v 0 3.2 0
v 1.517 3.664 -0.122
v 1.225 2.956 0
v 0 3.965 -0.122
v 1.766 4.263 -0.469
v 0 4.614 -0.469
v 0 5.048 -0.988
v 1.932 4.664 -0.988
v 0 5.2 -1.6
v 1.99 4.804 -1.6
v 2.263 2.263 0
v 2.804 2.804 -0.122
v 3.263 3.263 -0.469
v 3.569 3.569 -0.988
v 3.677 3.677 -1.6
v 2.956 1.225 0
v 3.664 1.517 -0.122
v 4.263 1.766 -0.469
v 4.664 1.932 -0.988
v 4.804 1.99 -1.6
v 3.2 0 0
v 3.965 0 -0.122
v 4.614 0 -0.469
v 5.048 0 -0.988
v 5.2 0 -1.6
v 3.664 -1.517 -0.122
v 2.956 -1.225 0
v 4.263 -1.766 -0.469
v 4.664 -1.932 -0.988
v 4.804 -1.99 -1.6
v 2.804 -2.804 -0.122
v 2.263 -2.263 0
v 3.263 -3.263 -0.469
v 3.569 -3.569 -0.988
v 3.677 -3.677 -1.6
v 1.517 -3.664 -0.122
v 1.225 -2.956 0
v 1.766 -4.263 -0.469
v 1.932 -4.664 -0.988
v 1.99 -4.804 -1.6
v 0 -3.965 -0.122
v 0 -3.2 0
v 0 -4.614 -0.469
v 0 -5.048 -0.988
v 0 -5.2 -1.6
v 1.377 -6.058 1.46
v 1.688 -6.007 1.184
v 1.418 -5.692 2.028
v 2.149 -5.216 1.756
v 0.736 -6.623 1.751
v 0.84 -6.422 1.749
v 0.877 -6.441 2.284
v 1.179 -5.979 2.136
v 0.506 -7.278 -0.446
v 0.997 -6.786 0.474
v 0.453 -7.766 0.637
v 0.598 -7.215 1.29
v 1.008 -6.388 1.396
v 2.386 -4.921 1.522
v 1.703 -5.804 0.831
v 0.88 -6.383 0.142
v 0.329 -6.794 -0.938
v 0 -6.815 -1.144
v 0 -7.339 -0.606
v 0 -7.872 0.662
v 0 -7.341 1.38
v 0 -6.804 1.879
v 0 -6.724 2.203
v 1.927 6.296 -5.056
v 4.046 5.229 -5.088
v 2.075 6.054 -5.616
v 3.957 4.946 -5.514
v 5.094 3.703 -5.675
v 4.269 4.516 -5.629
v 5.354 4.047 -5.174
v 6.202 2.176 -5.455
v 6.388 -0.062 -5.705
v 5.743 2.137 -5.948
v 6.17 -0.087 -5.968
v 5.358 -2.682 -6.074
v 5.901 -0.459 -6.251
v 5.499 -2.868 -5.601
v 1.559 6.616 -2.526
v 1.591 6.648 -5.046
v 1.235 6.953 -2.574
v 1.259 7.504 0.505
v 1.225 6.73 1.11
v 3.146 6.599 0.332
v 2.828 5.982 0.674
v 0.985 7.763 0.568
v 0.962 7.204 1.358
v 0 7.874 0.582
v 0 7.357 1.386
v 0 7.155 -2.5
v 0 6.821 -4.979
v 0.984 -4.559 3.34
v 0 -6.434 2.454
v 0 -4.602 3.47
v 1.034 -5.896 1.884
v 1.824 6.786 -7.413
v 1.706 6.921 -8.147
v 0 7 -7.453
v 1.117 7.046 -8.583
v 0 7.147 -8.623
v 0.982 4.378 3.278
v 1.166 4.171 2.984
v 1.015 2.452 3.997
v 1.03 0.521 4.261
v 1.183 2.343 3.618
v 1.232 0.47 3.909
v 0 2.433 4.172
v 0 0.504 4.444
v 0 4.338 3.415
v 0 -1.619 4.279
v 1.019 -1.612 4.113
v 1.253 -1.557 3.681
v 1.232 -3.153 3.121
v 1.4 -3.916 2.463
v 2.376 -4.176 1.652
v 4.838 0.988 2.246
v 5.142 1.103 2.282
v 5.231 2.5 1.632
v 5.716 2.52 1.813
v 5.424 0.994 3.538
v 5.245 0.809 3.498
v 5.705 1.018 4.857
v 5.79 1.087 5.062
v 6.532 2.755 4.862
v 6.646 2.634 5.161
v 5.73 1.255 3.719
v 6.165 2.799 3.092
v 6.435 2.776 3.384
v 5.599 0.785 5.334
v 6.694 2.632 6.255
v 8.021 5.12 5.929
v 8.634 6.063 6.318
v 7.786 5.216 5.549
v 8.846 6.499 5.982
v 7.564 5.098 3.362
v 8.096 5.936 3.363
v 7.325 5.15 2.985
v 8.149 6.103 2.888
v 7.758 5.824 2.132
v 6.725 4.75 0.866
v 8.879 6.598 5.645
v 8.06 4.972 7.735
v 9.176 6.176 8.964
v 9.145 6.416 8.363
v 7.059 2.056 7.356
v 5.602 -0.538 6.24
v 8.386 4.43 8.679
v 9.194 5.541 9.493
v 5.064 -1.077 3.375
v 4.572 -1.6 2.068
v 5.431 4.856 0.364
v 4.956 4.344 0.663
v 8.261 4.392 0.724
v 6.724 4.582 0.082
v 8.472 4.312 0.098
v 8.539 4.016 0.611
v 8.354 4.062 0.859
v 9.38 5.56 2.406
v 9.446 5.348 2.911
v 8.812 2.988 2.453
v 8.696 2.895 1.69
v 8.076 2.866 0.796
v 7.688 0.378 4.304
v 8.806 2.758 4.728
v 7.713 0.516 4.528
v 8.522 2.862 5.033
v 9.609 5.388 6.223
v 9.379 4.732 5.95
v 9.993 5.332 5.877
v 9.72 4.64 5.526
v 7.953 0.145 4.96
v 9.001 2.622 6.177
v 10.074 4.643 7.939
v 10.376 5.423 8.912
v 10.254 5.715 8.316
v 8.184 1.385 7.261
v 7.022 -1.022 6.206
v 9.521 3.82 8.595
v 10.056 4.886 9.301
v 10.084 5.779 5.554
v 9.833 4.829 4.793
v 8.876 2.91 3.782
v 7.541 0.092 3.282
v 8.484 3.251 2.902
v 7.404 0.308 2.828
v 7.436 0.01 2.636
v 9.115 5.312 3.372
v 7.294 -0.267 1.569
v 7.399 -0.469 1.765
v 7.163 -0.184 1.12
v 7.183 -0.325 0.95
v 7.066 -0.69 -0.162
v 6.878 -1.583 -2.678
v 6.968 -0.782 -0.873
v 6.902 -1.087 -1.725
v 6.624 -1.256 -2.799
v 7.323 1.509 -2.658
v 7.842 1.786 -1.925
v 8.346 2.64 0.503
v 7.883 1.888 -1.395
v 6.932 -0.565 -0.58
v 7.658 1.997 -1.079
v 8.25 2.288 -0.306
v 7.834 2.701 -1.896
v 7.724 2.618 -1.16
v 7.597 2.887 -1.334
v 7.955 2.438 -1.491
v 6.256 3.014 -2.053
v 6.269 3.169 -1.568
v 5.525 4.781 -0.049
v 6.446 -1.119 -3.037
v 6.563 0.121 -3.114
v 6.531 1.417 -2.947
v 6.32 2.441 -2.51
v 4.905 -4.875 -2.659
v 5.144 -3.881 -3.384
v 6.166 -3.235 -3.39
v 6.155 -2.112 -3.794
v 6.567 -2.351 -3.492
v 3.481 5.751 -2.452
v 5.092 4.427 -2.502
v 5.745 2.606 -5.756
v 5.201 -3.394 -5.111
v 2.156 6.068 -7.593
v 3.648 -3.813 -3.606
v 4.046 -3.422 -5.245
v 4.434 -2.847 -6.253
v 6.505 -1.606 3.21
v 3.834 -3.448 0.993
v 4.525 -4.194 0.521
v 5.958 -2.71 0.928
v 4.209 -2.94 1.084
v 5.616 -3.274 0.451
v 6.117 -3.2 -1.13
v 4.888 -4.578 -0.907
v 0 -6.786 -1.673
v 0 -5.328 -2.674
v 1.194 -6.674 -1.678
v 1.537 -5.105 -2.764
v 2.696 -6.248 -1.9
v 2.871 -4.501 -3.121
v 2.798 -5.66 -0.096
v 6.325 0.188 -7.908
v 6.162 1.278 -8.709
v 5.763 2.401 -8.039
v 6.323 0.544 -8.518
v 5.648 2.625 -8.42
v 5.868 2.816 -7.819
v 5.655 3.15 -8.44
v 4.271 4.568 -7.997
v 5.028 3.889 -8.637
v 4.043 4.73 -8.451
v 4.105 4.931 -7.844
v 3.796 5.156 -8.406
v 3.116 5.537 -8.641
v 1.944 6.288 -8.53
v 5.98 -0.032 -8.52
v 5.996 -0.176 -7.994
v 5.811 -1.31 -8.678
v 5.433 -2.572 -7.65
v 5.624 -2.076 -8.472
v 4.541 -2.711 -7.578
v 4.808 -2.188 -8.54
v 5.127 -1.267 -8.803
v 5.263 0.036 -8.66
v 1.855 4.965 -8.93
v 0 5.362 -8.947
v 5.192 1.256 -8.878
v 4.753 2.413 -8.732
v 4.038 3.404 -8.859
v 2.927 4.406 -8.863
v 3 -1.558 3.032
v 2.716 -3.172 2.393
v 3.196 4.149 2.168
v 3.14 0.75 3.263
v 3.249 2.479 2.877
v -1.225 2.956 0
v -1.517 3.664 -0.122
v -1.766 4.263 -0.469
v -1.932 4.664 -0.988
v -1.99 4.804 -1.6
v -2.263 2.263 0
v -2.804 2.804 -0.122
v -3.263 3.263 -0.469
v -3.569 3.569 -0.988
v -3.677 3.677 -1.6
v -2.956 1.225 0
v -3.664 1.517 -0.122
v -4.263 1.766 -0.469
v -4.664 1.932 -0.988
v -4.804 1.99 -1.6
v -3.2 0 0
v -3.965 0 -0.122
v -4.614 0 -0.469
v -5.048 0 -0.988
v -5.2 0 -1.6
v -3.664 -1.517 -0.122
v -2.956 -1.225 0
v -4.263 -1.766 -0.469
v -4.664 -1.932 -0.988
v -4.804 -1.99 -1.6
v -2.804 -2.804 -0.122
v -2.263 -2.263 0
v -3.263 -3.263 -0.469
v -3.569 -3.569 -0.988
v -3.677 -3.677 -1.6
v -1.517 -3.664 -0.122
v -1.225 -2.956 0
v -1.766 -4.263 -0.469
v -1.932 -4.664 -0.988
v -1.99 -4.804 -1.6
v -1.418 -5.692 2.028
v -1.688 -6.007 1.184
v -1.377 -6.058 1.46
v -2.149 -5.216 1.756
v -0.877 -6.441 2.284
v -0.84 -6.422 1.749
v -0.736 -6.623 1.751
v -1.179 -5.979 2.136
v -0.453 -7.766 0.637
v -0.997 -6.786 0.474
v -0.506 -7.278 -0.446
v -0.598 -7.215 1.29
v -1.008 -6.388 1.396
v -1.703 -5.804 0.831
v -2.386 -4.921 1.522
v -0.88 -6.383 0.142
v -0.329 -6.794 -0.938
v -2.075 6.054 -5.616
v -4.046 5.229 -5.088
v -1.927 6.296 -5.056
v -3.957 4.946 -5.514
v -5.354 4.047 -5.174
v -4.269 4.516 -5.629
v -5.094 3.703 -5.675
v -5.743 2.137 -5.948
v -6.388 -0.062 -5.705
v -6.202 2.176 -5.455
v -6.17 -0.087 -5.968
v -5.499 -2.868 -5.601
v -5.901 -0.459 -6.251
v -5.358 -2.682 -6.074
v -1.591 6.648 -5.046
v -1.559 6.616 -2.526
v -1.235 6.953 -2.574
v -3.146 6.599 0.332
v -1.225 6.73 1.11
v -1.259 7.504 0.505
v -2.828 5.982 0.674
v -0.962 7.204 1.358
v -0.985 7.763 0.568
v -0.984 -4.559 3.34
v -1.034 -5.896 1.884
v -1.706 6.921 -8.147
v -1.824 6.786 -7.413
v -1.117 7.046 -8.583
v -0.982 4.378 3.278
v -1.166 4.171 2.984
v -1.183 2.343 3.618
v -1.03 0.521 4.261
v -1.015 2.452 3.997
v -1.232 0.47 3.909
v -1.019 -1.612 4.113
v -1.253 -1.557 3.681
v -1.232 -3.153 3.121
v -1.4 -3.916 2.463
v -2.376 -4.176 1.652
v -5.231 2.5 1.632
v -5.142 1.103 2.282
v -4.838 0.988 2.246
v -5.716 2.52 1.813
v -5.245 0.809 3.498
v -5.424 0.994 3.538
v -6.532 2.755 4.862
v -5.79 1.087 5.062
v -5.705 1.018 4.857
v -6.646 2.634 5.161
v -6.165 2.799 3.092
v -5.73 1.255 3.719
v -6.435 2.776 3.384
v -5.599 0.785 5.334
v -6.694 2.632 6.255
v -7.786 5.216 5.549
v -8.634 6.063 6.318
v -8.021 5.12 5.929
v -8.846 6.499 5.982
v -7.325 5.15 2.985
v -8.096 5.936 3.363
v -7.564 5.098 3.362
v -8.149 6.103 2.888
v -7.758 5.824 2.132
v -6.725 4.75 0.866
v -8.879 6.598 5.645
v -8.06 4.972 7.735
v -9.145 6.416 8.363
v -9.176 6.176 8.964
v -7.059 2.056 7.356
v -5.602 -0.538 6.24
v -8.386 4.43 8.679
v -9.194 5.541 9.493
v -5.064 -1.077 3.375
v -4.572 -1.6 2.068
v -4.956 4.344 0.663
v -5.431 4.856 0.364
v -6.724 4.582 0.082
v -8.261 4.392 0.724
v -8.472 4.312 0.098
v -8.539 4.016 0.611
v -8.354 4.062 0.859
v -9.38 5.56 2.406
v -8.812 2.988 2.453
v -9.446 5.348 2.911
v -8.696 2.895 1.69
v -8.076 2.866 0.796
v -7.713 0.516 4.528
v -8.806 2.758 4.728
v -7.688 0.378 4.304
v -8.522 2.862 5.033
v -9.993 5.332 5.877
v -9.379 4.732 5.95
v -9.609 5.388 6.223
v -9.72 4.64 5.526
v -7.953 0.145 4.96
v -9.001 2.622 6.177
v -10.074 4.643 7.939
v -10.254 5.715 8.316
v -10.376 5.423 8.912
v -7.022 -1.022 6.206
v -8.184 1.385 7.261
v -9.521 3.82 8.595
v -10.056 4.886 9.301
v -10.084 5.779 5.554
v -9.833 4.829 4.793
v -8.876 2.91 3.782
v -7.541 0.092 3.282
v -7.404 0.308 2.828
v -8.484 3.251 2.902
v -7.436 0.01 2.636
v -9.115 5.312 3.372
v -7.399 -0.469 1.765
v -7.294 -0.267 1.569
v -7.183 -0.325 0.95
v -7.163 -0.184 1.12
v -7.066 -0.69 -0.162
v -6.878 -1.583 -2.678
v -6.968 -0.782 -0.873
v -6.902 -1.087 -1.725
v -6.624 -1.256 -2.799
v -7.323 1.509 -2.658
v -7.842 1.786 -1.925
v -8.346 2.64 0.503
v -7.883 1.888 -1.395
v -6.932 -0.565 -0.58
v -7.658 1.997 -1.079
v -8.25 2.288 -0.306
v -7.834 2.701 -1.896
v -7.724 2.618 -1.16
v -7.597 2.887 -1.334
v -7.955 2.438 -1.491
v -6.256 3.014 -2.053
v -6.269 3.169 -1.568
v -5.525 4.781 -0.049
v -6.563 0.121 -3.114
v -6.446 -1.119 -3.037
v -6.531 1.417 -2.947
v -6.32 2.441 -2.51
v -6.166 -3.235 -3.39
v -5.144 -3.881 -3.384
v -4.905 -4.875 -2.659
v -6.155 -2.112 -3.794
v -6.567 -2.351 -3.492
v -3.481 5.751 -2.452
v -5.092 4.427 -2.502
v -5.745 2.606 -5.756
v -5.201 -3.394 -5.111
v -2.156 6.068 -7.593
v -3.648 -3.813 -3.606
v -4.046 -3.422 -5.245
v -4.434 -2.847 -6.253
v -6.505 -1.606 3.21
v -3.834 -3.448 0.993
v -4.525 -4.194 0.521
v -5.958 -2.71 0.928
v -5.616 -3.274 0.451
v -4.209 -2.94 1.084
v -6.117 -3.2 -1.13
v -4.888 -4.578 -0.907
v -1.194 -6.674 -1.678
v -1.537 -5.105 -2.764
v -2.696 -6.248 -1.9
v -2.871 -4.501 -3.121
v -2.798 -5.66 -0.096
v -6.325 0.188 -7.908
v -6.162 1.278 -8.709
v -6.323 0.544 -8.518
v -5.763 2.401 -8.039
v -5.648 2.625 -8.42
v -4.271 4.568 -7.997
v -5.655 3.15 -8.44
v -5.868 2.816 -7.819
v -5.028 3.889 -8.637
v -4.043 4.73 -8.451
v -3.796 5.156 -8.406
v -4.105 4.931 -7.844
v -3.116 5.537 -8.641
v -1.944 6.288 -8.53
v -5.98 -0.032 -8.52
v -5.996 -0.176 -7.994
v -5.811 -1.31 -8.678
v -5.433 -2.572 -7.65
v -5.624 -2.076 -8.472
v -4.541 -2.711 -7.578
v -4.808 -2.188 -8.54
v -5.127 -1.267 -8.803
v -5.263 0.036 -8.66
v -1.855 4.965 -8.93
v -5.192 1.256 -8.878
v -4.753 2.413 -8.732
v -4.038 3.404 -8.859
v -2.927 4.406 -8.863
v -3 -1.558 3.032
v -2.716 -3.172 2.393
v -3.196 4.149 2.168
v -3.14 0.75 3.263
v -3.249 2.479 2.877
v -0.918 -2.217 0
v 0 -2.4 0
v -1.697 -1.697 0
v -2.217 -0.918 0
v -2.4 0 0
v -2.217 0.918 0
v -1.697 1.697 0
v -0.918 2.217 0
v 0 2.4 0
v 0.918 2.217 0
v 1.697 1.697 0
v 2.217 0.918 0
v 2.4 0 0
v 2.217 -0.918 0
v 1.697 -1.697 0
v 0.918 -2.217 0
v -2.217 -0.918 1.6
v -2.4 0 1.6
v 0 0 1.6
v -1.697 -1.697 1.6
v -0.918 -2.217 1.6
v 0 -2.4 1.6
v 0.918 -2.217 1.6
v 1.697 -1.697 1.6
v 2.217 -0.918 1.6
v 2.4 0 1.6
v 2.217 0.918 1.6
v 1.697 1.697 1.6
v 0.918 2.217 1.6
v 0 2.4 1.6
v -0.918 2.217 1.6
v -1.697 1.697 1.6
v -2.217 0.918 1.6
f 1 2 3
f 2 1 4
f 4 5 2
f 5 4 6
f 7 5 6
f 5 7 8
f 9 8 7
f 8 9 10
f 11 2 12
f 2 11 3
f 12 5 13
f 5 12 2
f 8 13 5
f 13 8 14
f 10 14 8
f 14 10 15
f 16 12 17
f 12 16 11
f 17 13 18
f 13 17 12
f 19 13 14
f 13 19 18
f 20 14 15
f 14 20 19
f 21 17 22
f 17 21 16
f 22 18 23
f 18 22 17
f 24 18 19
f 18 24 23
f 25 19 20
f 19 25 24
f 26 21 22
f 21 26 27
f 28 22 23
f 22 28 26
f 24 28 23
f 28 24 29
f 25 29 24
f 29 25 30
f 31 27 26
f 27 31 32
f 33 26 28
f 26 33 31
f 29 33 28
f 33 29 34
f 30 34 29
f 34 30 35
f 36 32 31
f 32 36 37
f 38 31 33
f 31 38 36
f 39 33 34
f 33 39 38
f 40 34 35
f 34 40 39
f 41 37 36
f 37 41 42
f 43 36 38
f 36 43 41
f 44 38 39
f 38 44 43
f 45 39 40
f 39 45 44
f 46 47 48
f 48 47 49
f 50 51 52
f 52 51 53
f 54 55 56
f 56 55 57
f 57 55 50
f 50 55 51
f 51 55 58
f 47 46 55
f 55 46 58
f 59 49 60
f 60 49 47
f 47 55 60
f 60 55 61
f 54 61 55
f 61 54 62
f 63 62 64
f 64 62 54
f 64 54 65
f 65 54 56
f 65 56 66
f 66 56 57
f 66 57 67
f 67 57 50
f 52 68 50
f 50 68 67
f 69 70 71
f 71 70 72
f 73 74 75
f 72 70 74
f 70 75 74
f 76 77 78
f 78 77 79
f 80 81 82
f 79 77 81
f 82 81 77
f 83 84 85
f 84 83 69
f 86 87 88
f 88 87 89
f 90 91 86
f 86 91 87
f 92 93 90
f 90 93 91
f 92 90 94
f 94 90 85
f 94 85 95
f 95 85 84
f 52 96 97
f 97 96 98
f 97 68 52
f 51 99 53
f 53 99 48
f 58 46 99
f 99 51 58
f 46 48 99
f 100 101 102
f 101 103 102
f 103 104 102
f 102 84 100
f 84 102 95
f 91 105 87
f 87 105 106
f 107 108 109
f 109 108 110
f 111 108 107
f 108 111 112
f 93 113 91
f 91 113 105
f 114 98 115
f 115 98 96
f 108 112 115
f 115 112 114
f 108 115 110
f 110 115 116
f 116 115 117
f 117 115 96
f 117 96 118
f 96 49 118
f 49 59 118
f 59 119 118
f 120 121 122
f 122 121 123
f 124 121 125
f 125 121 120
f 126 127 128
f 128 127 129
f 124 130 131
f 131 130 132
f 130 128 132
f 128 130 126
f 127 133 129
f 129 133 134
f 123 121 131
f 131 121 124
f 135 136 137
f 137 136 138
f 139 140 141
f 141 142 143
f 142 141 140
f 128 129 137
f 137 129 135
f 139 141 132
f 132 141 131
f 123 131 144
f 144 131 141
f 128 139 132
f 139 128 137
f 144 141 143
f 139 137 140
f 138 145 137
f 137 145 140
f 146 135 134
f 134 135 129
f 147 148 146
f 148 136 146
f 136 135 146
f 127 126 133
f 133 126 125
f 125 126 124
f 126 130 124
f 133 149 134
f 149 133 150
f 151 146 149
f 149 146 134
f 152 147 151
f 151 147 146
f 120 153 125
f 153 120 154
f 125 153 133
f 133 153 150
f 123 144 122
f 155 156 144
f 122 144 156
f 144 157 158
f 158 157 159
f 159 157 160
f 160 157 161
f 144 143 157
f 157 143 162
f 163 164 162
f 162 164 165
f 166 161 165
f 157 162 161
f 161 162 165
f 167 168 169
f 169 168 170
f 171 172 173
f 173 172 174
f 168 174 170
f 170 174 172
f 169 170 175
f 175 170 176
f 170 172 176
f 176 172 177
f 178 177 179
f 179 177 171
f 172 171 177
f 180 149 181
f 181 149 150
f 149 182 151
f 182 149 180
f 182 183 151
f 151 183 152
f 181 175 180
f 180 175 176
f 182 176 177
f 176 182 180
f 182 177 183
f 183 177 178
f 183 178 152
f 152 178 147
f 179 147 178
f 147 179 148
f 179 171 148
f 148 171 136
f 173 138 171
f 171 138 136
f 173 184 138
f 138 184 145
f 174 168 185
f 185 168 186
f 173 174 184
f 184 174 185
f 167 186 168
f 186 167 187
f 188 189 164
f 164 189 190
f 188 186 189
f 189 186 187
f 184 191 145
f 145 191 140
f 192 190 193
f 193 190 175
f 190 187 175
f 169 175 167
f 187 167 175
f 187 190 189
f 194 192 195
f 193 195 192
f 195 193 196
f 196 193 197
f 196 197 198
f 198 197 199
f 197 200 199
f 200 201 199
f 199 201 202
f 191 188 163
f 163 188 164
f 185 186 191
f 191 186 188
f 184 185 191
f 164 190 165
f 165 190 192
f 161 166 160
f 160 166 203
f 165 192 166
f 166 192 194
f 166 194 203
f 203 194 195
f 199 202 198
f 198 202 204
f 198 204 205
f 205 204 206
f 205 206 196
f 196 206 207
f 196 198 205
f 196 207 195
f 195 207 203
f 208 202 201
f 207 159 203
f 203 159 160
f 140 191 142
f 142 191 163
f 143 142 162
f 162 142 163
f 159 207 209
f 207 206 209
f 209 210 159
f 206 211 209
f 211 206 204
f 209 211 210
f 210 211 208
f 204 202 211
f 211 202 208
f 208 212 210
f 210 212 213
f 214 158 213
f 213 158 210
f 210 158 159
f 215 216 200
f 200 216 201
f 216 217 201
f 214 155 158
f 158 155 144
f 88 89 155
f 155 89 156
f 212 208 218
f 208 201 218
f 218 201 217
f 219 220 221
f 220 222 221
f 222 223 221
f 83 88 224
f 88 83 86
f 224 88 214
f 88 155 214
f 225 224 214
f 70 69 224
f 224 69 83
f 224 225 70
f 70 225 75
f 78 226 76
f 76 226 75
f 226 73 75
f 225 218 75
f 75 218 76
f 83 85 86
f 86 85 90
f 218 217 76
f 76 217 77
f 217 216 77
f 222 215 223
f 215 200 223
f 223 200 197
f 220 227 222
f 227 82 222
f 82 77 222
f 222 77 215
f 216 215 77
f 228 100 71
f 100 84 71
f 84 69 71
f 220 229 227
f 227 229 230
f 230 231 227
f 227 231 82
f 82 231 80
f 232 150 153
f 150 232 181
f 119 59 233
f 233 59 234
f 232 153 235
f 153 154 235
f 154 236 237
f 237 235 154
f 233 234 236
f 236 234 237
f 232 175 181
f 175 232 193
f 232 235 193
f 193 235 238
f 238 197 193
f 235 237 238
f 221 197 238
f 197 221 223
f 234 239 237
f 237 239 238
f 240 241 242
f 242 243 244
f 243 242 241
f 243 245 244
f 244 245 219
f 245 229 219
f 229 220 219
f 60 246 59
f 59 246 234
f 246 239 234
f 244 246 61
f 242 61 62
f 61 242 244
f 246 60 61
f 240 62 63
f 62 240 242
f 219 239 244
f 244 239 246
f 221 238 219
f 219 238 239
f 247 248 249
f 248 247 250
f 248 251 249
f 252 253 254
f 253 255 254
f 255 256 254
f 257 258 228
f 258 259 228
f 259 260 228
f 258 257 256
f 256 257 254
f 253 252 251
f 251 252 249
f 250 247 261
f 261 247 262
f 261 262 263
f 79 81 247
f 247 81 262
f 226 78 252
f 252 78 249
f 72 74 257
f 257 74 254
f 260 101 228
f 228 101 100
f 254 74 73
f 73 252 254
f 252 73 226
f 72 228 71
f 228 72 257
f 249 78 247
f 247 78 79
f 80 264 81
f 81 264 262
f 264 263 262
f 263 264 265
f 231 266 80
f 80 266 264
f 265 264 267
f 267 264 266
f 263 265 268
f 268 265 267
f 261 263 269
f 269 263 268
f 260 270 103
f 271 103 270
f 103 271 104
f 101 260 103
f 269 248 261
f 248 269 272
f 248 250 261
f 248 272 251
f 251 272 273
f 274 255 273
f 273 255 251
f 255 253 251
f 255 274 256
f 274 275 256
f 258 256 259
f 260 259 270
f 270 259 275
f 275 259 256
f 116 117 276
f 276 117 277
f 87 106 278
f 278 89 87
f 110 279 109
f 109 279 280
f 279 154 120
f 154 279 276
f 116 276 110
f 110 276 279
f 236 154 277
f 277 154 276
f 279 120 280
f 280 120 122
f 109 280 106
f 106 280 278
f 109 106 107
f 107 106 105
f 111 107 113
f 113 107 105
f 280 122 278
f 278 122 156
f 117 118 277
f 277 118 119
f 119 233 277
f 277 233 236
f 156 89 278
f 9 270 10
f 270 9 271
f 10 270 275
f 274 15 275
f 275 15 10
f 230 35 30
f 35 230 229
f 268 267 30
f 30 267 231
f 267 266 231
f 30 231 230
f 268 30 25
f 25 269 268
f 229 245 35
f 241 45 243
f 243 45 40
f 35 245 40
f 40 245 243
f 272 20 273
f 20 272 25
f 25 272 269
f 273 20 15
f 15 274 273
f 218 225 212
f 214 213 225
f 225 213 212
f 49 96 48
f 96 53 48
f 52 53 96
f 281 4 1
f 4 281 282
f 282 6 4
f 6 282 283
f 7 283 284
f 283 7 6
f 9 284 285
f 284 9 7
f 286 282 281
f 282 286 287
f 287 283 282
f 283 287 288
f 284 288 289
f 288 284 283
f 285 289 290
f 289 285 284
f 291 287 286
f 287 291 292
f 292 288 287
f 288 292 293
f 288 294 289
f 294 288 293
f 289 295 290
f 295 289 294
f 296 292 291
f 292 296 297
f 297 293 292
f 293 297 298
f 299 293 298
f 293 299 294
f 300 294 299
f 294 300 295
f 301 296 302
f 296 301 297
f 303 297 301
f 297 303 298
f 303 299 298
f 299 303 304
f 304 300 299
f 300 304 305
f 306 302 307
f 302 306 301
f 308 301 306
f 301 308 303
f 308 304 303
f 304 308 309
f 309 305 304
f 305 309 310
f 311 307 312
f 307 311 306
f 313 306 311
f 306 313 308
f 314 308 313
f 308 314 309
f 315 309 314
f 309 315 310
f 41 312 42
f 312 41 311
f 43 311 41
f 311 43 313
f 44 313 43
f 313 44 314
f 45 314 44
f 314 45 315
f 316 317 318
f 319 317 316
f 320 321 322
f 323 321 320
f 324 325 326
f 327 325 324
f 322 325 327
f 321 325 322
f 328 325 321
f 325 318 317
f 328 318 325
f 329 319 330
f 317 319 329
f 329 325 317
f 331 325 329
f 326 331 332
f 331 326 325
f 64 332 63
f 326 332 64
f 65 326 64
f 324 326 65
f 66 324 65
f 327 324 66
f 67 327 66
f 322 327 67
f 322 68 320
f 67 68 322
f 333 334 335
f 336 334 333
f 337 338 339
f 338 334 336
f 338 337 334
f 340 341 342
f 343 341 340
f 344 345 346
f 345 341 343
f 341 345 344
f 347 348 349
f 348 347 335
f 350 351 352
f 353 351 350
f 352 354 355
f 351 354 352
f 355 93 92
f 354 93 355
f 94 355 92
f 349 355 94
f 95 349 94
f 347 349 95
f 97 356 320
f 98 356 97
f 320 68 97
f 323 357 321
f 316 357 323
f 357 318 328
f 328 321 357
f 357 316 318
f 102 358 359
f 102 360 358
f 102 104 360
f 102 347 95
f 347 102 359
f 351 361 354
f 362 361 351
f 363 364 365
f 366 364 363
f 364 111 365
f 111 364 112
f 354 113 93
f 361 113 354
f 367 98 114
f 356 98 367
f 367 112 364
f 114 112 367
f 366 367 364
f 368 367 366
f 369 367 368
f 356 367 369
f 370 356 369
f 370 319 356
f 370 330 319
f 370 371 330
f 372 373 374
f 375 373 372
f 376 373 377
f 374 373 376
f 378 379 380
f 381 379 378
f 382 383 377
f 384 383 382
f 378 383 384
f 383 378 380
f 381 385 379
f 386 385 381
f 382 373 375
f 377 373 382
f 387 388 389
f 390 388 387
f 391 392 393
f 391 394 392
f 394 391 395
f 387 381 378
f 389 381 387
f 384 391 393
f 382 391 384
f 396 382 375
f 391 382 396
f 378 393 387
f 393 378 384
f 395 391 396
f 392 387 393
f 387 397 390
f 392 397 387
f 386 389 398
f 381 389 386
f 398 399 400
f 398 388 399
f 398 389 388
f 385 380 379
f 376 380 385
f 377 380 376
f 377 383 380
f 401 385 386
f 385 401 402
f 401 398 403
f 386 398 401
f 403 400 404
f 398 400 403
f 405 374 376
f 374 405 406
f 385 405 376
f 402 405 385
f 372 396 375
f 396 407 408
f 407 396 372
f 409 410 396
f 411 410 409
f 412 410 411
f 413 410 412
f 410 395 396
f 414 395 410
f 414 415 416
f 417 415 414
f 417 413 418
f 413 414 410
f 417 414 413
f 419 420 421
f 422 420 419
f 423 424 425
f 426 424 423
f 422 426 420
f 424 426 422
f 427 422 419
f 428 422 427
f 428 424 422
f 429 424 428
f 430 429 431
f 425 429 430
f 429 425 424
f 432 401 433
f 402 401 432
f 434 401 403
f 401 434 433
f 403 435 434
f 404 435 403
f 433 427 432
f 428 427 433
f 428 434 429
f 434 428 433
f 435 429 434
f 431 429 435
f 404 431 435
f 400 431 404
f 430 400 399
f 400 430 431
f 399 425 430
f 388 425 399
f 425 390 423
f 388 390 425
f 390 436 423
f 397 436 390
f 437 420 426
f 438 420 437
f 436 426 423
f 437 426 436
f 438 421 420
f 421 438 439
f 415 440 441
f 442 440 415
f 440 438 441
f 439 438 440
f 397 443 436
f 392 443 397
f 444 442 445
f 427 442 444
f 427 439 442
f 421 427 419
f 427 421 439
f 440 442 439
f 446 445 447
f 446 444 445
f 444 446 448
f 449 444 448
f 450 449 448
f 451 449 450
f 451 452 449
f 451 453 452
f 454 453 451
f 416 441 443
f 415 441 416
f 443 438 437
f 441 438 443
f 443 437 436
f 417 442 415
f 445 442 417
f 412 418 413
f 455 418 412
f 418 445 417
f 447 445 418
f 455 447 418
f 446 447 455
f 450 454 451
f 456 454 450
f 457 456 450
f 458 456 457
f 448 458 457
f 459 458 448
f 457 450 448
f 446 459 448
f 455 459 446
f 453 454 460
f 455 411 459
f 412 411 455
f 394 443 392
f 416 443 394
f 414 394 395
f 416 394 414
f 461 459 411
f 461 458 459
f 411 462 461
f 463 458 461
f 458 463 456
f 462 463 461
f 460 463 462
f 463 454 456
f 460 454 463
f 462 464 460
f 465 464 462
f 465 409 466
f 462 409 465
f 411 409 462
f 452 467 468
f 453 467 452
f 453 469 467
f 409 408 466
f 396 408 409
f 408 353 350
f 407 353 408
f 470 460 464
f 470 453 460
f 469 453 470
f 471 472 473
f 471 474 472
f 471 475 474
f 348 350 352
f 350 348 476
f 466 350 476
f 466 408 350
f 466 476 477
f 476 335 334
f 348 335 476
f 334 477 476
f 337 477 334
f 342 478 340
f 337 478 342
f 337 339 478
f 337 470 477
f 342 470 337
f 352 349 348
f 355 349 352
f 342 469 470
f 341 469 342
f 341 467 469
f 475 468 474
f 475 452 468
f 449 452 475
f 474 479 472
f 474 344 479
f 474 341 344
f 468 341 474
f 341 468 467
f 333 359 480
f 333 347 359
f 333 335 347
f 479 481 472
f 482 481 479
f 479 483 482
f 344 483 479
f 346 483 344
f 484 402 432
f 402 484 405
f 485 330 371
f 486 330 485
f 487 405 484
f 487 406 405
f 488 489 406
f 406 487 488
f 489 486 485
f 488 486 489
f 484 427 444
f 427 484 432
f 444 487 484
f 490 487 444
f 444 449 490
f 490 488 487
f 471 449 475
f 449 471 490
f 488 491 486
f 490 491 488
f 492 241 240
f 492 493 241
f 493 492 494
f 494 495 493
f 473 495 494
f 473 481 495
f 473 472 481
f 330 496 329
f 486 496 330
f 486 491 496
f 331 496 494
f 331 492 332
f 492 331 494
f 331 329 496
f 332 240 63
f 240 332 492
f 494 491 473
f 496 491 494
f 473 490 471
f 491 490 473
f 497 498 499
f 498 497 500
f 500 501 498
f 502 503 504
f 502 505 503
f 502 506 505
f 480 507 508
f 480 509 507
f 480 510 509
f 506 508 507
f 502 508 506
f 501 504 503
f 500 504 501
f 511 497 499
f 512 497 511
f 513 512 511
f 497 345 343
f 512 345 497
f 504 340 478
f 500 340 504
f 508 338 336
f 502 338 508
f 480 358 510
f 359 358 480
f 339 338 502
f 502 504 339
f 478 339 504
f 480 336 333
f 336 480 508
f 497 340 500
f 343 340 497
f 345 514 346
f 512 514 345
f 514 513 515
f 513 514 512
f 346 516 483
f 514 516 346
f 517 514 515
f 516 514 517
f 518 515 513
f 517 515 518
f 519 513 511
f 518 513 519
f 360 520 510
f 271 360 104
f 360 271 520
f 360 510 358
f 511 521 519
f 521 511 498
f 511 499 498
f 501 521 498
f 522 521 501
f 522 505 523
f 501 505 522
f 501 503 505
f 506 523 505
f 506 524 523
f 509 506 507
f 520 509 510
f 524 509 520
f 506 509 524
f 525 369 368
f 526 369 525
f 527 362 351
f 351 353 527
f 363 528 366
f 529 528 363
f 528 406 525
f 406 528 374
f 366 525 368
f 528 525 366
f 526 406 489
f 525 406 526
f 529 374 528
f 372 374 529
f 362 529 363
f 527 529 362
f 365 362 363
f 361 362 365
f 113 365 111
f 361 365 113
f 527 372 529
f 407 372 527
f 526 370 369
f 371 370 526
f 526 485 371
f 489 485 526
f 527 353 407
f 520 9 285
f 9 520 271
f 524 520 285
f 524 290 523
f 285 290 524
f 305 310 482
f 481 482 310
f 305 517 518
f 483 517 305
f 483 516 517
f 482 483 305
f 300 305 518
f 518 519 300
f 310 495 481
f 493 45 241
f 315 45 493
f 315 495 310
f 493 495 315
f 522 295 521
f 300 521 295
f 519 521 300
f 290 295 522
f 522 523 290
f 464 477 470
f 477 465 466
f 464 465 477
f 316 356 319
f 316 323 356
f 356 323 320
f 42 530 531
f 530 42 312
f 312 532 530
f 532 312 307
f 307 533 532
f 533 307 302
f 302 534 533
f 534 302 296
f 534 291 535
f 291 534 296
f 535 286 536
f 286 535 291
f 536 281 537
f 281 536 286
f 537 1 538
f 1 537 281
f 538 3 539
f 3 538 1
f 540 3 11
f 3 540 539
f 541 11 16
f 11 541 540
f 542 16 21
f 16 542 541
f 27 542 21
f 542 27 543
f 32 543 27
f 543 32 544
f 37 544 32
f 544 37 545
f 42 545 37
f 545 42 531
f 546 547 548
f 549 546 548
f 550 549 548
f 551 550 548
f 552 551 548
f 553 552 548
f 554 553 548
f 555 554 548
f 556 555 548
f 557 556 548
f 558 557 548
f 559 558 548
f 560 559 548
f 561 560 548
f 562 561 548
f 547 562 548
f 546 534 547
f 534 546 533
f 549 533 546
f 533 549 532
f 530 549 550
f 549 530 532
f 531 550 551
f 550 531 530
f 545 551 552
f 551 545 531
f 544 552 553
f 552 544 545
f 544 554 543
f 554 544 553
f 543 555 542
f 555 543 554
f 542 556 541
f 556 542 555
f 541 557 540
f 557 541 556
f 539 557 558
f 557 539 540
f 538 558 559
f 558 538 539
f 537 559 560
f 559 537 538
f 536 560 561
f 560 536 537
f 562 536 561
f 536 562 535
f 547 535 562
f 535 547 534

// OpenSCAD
use <../lib.scad>
use <s/24088s01.scad>
use <../p/stud4o.scad>
function ldraw_lib__24088() = [
// 0 Minifig Helmet with Wings and Eagle Head
// 0 Name: 24088.dat
// 0 Author: Philippe Hurbain [Philo]
// 0 !LDRAW_ORG Part UPDATE 2018-02
// 0 !LICENSE Licensed under CC BY 4.0 : see CAreadme.txt
// 
// 0 BFC CERTIFY CCW
  [0,"BFC","CERTIFY"],
  [0,"BFC","CCW"],
// 
// 0 !CATEGORY Minifig Headwear
// 
// 0 !HISTORY 2016-03-18 {LEGO Digital Designer} Original part shape
// 0 !HISTORY 2017-11-03 [Philo] File preparation for LDraw Parts Tracker
// 0 !HISTORY 2018-12-08 [PTadmin] Official Update 2018-02
// 
// 
// 1 16 0 0 0 1 0 0 0 1 0 0 0 1 s\24088s01.dat
  [1,16,0,0,0,1,0,0,0,1,0,0,0,1, ldraw_lib__s__24088s01()],
// 1 16 0 0 0 -1 0 0 0 1 0 0 0 1 s\24088s01.dat
  [1,16,0,0,0,-1,0,0,0,1,0,0,0,1, ldraw_lib__s__24088s01()],
// 1 16 0 -4 0 1 0 0 0 -1 0 0 0 -1 stud4o.dat
  [1,16,0,-4,0,1,0,0,0,-1,0,0,0,-1, ldraw_lib__stud4o()],
// 5 24 0 1.515 -18.348 0 2.86 -17.037 0.823 2.346 -16.986 -0.823 2.346 -16.986
  [5,24,0,1.515,-18.348,0,2.86,-17.037,0.823,2.346,-16.986,-0.823,2.346,-16.986],
// 5 24 0 -1.655 -19.679 0 1.515 -18.348 1.266 1.115 -18.196 -1.266 1.115 -18.196
  [5,24,0,-1.655,-19.679,0,1.515,-18.348,1.266,1.115,-18.196,-1.266,1.115,-18.196],
// 5 24 0 -3.449 -18.353 0 -1.655 -19.679 1.133 -1.592 -19.415 -1.133 -1.592 -19.415
  [5,24,0,-3.449,-18.353,0,-1.655,-19.679,1.133,-1.592,-19.415,-1.133,-1.592,-19.415],
// 5 24 0 -4.697 -17.009 0 -3.449 -18.353 1.496 -3.225 -18.038 -1.496 -3.225 -18.038
  [5,24,0,-4.697,-17.009,0,-3.449,-18.353,1.496,-3.225,-18.038,-1.496,-3.225,-18.038],
// 5 24 0 -5.507 -16.811 0 -4.697 -17.009 1.841 -4.378 -16.558 -1.841 -4.378 -16.558
  [5,24,0,-5.507,-16.811,0,-4.697,-17.009,1.841,-4.378,-16.558,-1.841,-4.378,-16.558],
// 5 24 0 -1.454 19.684 0 -3.466 18.393 2.463 -1.421 19.407 -2.463 -1.421 19.407
  [5,24,0,-1.454,19.684,0,-3.466,18.393,2.463,-1.421,19.407,-2.463,-1.421,19.407],
// 5 24 0 6.25 17.887 0 -1.454 19.684 2.463 -1.421 19.407 -2.463 -1.421 19.407
  [5,24,0,6.25,17.887,0,-1.454,19.684,2.463,-1.421,19.407,-2.463,-1.421,19.407],
// 5 24 0 12.448 17.052 0 6.25 17.887 3.088 6.434 17.382 -3.088 6.434 17.382
  [5,24,0,12.448,17.052,0,6.25,17.887,3.088,6.434,17.382,-3.088,6.434,17.382],
// 5 24 0 -8.674 -11.504 0 -6.134 -16.085 2.459 -8.35 -11.398 -2.459 -8.35 -11.398
  [5,24,0,-8.674,-11.504,0,-6.134,-16.085,2.459,-8.35,-11.398,-2.459,-8.35,-11.398],
// 5 24 0 -6.134 -16.085 0 -5.507 -16.811 2.192 -5.711 -16.102 -2.192 -5.711 -16.102
  [5,24,0,-6.134,-16.085,0,-5.507,-16.811,2.192,-5.711,-16.102,-2.192,-5.711,-16.102],
// 5 24 0 21.558 17.867 0 18.633 17.499 2.792 21.457 17.614 -2.792 21.457 17.614
  [5,24,0,21.558,17.867,0,18.633,17.499,2.792,21.457,17.614,-2.792,21.457,17.614],
// 5 24 0 18.633 17.499 0 12.448 17.052 3.977 12.616 16.62 -3.977 12.616 16.62
  [5,24,0,18.633,17.499,0,12.448,17.052,3.977,12.616,16.62,-3.977,12.616,16.62],
// 5 24 0 -10.429 6.083 0 -11.111 1.261 2.575 -10.652 1.302 -2.575 -10.652 1.302
  [5,24,0,-10.429,6.083,0,-11.111,1.261,2.575,-10.652,1.302,-2.575,-10.652,1.302],
// 5 24 0 -3.466 18.393 0 -8.538 10.845 2.404 -3.395 18.009 -2.404 -3.395 18.009
  [5,24,0,-3.466,18.393,0,-8.538,10.845,2.404,-3.395,18.009,-2.404,-3.395,18.009],
// 5 24 0 -10.698 -4.048 0 -8.674 -11.504 2.548 -10.282 -4.029 -2.548 -10.282 -4.029
  [5,24,0,-10.698,-4.048,0,-8.674,-11.504,2.548,-10.282,-4.029,-2.548,-10.282,-4.029],
// 5 24 0 -11.111 1.261 0 -10.698 -4.048 2.548 -10.282 -4.029 -2.548 -10.282 -4.029
  [5,24,0,-11.111,1.261,0,-10.698,-4.048,2.548,-10.282,-4.029,-2.548,-10.282,-4.029],
// 5 24 0 4.183 -16.964 0 6.685 -13.319 2.986 4.196 -16.686 -2.986 4.196 -16.686
  [5,24,0,4.183,-16.964,0,6.685,-13.319,2.986,4.196,-16.686,-2.986,4.196,-16.686],
// 5 24 0 2.86 -17.037 0 4.183 -16.964 2.986 4.196 -16.686 -2.986 4.196 -16.686
  [5,24,0,2.86,-17.037,0,4.183,-16.964,2.986,4.196,-16.686,-2.986,4.196,-16.686],
// 5 24 0 22.367 13.406 0 21.558 17.867 4.638 22.324 12.413 -4.638 22.324 12.413
  [5,24,0,22.367,13.406,0,21.558,17.867,4.638,22.324,12.413,-4.638,22.324,12.413],
// 5 24 0 -8.538 10.845 0 -10.429 6.083 2.537 -9.993 6.129 -2.537 -9.993 6.129
  [5,24,0,-8.538,10.845,0,-10.429,6.083,2.537,-9.993,6.129,-2.537,-9.993,6.129],
// 5 24 0 4 13 0 22.367 13.406 4.9752 4 12.0104 -4.9752 4 12.0104
  [5,24,0,4,13,0,22.367,13.406,4.9752,4,12.0104,-4.9752,4,12.0104],
// 5 24 0 6.685 -13.319 0 4 -13 3.843 6.909 -12.763 -3.843 6.909 -12.763
  [5,24,0,6.685,-13.319,0,4,-13,3.843,6.909,-12.763,-3.843,6.909,-12.763],
];
module ldraw_lib__24088(step=0, col=false, unit=2/5, alt=false, line=0.2, solid=!$preview)
    makepoly(ldraw_lib__24088(), step=step, col=col, unit=unit, alt=alt, line=line, solid=solid);
ldraw_lib__24088(line=0.2);
